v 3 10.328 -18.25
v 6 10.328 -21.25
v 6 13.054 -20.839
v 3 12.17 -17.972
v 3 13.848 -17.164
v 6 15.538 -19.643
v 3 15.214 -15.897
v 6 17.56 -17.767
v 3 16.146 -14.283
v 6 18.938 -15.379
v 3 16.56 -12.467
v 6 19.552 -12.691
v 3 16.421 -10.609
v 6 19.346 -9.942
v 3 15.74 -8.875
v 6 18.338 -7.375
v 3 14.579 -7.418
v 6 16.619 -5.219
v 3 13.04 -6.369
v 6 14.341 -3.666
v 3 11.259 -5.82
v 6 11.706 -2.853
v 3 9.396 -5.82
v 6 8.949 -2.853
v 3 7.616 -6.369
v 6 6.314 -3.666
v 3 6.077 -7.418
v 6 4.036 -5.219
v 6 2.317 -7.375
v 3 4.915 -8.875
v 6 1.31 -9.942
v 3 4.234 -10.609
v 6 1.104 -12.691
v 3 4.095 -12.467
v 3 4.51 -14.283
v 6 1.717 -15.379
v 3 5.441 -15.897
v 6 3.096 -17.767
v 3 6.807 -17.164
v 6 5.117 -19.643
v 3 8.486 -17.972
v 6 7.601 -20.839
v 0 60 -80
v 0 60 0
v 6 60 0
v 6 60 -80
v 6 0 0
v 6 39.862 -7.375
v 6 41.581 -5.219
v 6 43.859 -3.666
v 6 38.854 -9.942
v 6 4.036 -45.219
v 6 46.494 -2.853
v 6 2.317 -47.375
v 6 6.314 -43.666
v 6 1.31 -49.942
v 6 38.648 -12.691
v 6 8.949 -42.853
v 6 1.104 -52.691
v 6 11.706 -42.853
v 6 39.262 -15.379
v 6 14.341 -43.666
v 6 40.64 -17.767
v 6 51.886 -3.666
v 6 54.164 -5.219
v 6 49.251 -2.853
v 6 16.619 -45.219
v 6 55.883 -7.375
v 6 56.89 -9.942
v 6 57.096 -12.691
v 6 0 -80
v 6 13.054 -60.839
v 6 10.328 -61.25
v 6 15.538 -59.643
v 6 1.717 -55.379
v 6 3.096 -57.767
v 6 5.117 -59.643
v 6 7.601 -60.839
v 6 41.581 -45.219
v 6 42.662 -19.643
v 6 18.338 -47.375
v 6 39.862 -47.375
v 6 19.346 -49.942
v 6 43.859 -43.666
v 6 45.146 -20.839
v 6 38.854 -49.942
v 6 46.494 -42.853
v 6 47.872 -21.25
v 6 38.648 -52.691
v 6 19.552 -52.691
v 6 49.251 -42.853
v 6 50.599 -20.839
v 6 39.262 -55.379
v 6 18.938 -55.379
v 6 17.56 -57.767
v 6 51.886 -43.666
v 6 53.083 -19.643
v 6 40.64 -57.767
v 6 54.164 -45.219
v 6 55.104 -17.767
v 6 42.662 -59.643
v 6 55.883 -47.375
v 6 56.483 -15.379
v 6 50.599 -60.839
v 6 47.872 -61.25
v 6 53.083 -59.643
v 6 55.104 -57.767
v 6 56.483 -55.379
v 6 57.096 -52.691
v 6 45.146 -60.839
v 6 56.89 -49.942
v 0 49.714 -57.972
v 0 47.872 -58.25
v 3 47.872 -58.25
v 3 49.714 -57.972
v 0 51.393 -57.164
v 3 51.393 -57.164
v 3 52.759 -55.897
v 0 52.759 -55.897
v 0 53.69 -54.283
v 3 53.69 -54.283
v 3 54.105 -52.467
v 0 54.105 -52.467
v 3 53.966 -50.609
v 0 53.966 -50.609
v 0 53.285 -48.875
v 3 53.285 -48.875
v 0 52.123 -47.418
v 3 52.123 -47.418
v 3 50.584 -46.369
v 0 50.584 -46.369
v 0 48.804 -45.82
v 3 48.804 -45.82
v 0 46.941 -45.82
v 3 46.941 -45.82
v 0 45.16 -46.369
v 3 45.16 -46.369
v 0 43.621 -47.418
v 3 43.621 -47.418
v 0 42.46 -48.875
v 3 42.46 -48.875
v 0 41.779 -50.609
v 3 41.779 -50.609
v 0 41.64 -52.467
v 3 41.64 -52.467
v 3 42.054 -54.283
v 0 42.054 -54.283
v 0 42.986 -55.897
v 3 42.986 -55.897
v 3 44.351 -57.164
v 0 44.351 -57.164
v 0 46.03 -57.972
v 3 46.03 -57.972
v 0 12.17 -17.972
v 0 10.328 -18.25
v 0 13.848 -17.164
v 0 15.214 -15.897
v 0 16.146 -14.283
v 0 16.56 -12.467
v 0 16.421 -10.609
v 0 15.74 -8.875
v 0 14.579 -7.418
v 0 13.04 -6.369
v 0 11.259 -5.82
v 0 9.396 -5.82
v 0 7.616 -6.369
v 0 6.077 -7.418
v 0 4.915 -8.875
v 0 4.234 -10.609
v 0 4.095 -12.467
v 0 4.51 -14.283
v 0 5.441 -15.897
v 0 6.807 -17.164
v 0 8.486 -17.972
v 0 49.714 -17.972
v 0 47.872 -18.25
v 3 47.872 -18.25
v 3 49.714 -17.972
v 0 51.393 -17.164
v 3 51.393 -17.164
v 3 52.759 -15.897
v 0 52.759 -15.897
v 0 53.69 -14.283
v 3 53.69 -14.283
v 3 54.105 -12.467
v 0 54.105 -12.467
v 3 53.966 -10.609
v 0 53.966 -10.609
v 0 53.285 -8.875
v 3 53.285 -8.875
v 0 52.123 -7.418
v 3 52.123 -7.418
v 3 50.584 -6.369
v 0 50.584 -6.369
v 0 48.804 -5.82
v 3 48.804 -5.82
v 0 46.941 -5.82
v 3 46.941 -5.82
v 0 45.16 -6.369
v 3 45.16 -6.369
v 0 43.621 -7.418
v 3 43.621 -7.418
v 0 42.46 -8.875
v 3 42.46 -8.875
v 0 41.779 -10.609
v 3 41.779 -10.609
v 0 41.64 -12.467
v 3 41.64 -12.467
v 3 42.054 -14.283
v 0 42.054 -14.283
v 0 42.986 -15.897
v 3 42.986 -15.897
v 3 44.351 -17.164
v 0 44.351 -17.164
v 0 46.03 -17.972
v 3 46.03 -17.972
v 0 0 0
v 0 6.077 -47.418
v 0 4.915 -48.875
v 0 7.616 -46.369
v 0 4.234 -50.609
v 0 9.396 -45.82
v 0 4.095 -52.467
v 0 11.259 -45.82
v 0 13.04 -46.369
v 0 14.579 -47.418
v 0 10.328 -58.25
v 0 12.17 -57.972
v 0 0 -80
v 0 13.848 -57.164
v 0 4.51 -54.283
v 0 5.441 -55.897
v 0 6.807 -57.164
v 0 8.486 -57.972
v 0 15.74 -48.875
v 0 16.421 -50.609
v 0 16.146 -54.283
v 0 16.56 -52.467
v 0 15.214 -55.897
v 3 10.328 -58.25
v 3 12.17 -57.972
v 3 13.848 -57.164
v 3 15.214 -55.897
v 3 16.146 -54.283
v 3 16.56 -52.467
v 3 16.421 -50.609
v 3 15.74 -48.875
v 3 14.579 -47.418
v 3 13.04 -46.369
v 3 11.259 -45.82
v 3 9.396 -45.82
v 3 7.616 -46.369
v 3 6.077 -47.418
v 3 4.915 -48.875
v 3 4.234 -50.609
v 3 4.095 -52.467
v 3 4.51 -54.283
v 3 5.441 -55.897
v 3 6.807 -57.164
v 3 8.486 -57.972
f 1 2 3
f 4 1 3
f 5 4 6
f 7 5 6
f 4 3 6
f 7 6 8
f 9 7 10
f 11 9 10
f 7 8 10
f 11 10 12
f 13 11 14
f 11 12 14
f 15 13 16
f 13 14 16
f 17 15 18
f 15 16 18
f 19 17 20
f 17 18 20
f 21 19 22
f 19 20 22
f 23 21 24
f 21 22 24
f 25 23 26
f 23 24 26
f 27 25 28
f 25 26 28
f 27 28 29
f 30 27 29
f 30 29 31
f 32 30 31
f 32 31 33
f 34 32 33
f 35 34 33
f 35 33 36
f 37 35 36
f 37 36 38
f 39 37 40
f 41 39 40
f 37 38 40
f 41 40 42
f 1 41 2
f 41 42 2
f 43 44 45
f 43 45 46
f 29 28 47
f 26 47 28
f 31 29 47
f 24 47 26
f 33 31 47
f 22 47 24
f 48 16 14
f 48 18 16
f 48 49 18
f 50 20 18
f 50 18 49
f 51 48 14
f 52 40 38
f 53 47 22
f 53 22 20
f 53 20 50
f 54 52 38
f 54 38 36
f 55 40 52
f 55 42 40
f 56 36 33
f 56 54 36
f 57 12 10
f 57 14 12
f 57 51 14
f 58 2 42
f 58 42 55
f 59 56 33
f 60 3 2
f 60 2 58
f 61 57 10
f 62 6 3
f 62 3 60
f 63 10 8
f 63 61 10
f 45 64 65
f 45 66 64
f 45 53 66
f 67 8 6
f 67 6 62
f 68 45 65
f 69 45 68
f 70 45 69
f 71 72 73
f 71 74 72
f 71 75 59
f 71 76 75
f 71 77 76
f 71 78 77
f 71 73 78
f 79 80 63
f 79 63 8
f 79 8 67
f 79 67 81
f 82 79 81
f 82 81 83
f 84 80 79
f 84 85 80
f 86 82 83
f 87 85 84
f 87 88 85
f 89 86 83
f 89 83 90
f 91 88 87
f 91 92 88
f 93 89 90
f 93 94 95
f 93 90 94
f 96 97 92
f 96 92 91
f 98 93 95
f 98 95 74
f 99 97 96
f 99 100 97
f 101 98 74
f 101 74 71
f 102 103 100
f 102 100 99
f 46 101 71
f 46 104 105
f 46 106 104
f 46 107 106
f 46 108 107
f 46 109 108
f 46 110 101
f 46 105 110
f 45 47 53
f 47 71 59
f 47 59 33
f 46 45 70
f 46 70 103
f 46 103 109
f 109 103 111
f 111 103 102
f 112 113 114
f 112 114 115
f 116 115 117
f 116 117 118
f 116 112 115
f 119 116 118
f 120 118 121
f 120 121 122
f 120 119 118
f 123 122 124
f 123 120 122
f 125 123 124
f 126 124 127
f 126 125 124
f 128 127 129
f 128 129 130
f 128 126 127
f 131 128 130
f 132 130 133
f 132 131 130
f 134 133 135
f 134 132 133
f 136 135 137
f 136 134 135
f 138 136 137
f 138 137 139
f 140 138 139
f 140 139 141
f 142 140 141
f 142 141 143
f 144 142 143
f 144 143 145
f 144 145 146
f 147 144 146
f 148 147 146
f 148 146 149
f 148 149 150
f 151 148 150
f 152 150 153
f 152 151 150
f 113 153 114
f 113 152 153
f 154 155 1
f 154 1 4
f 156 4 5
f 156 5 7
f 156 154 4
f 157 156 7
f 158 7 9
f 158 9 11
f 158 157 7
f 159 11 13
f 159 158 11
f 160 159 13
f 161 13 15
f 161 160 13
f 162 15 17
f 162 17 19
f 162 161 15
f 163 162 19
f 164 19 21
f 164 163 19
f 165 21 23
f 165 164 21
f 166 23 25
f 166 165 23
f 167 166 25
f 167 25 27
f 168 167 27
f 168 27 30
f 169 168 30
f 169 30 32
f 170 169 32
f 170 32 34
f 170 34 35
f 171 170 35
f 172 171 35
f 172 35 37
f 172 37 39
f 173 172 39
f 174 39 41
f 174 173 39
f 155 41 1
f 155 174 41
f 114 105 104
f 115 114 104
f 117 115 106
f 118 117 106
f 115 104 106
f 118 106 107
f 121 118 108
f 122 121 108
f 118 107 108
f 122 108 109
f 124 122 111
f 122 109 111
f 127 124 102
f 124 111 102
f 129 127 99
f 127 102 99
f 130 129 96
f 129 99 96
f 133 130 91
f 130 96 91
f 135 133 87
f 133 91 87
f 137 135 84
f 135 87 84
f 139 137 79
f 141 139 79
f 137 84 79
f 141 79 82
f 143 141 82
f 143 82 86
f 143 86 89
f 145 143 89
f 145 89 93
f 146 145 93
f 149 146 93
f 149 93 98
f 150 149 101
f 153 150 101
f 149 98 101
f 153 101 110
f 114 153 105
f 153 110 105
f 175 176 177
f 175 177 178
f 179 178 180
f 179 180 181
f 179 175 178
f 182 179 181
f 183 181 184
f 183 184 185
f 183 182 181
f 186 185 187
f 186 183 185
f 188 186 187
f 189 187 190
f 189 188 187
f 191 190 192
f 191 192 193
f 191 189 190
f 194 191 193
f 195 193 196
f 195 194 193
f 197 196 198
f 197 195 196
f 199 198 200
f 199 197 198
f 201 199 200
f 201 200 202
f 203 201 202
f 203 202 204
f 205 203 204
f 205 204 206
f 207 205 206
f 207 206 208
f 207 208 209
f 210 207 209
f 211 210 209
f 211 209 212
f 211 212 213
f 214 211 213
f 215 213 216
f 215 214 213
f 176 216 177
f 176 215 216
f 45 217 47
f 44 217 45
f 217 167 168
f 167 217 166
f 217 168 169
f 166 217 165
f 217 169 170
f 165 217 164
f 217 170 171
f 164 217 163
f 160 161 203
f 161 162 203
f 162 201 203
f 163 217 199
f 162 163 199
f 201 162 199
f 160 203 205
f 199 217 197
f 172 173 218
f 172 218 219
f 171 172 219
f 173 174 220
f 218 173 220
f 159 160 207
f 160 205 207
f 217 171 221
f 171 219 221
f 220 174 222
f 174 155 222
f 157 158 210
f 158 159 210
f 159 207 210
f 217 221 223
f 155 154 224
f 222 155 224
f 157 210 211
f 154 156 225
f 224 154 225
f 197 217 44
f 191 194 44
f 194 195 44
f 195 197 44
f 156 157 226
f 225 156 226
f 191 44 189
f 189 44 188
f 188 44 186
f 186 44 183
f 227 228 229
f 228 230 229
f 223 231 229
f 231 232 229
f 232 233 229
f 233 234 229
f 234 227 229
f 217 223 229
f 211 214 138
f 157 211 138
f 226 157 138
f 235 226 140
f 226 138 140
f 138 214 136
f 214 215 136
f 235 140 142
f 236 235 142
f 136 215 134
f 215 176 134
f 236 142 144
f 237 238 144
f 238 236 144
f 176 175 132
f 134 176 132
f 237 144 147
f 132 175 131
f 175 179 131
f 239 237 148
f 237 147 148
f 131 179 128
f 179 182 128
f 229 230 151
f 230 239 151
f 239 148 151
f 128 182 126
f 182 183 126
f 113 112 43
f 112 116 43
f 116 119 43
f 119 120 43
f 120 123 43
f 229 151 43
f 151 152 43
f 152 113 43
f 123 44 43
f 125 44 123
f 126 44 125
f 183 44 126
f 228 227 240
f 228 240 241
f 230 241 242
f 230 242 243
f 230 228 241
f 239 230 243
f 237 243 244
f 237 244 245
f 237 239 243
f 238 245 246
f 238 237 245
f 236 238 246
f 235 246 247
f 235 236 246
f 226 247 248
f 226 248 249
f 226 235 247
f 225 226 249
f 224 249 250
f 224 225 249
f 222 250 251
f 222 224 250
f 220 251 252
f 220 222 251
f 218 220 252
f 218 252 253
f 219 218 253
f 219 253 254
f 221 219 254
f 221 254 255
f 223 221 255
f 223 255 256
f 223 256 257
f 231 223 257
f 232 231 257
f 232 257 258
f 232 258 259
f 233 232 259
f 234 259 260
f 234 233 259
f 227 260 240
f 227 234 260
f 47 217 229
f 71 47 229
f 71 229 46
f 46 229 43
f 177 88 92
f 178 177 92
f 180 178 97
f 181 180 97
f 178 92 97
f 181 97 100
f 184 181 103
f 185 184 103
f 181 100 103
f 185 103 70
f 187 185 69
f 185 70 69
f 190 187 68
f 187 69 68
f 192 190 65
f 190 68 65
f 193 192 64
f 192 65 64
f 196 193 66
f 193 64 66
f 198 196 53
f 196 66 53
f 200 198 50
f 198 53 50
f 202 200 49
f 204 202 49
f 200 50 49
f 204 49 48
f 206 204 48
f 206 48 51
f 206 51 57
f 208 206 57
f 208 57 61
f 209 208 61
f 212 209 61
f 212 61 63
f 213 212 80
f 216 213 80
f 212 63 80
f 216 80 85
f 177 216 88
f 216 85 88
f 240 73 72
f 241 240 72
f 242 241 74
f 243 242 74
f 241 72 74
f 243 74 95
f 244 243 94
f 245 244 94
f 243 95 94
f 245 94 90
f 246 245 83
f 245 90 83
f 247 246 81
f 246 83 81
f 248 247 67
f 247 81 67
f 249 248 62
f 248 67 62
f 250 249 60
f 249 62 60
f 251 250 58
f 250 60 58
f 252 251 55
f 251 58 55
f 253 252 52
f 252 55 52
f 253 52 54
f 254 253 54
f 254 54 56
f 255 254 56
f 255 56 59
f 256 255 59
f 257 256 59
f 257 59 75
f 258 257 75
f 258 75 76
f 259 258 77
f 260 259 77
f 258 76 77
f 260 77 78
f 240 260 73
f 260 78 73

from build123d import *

# Parameters (mm, degrees)
ESBO_O1_W                = 80
ESBO_O1_H                = 60
ESBO_O1_R                = 6.25
RESSALTO_EXTRUS_O1_DEPTH = 6
CHANFRO1_SIZE            = 3


with BuildPart() as part:
    # Esboço1 → Ressalto-extrusão1 (new body)
    with BuildSketch(Plane(origin=(0, 0, 0), x_dir=(0, 0, -1), z_dir=(1, 0, 0))):
        with Locations((40, 30)):
            Rectangle(ESBO_O1_W, ESBO_O1_H)
        with Locations((12, 10.327729246)):
            Circle(ESBO_O1_R, mode=Mode.SUBTRACT)
        with Locations((12, 47.872237221)):
            Circle(ESBO_O1_R, mode=Mode.SUBTRACT)
        with Locations((52, 47.872237221)):
            Circle(ESBO_O1_R, mode=Mode.SUBTRACT)
        with Locations((52, 10.327729246)):
            Circle(ESBO_O1_R, mode=Mode.SUBTRACT)
    extrude(amount=RESSALTO_EXTRUS_O1_DEPTH)

    # Chanfro1
    chanfro1_edges = [part.edges().sort_by_distance(p)[0] for p in [
        (6, 10.327729246, -5.75),
        (6, 47.872237221, -5.75),
        (6, 47.872237221, -45.75),
        (6, 10.327729246, -45.75),
    ]]
    chamfer(chanfro1_edges, length=CHANFRO1_SIZE)


solid = part.part
